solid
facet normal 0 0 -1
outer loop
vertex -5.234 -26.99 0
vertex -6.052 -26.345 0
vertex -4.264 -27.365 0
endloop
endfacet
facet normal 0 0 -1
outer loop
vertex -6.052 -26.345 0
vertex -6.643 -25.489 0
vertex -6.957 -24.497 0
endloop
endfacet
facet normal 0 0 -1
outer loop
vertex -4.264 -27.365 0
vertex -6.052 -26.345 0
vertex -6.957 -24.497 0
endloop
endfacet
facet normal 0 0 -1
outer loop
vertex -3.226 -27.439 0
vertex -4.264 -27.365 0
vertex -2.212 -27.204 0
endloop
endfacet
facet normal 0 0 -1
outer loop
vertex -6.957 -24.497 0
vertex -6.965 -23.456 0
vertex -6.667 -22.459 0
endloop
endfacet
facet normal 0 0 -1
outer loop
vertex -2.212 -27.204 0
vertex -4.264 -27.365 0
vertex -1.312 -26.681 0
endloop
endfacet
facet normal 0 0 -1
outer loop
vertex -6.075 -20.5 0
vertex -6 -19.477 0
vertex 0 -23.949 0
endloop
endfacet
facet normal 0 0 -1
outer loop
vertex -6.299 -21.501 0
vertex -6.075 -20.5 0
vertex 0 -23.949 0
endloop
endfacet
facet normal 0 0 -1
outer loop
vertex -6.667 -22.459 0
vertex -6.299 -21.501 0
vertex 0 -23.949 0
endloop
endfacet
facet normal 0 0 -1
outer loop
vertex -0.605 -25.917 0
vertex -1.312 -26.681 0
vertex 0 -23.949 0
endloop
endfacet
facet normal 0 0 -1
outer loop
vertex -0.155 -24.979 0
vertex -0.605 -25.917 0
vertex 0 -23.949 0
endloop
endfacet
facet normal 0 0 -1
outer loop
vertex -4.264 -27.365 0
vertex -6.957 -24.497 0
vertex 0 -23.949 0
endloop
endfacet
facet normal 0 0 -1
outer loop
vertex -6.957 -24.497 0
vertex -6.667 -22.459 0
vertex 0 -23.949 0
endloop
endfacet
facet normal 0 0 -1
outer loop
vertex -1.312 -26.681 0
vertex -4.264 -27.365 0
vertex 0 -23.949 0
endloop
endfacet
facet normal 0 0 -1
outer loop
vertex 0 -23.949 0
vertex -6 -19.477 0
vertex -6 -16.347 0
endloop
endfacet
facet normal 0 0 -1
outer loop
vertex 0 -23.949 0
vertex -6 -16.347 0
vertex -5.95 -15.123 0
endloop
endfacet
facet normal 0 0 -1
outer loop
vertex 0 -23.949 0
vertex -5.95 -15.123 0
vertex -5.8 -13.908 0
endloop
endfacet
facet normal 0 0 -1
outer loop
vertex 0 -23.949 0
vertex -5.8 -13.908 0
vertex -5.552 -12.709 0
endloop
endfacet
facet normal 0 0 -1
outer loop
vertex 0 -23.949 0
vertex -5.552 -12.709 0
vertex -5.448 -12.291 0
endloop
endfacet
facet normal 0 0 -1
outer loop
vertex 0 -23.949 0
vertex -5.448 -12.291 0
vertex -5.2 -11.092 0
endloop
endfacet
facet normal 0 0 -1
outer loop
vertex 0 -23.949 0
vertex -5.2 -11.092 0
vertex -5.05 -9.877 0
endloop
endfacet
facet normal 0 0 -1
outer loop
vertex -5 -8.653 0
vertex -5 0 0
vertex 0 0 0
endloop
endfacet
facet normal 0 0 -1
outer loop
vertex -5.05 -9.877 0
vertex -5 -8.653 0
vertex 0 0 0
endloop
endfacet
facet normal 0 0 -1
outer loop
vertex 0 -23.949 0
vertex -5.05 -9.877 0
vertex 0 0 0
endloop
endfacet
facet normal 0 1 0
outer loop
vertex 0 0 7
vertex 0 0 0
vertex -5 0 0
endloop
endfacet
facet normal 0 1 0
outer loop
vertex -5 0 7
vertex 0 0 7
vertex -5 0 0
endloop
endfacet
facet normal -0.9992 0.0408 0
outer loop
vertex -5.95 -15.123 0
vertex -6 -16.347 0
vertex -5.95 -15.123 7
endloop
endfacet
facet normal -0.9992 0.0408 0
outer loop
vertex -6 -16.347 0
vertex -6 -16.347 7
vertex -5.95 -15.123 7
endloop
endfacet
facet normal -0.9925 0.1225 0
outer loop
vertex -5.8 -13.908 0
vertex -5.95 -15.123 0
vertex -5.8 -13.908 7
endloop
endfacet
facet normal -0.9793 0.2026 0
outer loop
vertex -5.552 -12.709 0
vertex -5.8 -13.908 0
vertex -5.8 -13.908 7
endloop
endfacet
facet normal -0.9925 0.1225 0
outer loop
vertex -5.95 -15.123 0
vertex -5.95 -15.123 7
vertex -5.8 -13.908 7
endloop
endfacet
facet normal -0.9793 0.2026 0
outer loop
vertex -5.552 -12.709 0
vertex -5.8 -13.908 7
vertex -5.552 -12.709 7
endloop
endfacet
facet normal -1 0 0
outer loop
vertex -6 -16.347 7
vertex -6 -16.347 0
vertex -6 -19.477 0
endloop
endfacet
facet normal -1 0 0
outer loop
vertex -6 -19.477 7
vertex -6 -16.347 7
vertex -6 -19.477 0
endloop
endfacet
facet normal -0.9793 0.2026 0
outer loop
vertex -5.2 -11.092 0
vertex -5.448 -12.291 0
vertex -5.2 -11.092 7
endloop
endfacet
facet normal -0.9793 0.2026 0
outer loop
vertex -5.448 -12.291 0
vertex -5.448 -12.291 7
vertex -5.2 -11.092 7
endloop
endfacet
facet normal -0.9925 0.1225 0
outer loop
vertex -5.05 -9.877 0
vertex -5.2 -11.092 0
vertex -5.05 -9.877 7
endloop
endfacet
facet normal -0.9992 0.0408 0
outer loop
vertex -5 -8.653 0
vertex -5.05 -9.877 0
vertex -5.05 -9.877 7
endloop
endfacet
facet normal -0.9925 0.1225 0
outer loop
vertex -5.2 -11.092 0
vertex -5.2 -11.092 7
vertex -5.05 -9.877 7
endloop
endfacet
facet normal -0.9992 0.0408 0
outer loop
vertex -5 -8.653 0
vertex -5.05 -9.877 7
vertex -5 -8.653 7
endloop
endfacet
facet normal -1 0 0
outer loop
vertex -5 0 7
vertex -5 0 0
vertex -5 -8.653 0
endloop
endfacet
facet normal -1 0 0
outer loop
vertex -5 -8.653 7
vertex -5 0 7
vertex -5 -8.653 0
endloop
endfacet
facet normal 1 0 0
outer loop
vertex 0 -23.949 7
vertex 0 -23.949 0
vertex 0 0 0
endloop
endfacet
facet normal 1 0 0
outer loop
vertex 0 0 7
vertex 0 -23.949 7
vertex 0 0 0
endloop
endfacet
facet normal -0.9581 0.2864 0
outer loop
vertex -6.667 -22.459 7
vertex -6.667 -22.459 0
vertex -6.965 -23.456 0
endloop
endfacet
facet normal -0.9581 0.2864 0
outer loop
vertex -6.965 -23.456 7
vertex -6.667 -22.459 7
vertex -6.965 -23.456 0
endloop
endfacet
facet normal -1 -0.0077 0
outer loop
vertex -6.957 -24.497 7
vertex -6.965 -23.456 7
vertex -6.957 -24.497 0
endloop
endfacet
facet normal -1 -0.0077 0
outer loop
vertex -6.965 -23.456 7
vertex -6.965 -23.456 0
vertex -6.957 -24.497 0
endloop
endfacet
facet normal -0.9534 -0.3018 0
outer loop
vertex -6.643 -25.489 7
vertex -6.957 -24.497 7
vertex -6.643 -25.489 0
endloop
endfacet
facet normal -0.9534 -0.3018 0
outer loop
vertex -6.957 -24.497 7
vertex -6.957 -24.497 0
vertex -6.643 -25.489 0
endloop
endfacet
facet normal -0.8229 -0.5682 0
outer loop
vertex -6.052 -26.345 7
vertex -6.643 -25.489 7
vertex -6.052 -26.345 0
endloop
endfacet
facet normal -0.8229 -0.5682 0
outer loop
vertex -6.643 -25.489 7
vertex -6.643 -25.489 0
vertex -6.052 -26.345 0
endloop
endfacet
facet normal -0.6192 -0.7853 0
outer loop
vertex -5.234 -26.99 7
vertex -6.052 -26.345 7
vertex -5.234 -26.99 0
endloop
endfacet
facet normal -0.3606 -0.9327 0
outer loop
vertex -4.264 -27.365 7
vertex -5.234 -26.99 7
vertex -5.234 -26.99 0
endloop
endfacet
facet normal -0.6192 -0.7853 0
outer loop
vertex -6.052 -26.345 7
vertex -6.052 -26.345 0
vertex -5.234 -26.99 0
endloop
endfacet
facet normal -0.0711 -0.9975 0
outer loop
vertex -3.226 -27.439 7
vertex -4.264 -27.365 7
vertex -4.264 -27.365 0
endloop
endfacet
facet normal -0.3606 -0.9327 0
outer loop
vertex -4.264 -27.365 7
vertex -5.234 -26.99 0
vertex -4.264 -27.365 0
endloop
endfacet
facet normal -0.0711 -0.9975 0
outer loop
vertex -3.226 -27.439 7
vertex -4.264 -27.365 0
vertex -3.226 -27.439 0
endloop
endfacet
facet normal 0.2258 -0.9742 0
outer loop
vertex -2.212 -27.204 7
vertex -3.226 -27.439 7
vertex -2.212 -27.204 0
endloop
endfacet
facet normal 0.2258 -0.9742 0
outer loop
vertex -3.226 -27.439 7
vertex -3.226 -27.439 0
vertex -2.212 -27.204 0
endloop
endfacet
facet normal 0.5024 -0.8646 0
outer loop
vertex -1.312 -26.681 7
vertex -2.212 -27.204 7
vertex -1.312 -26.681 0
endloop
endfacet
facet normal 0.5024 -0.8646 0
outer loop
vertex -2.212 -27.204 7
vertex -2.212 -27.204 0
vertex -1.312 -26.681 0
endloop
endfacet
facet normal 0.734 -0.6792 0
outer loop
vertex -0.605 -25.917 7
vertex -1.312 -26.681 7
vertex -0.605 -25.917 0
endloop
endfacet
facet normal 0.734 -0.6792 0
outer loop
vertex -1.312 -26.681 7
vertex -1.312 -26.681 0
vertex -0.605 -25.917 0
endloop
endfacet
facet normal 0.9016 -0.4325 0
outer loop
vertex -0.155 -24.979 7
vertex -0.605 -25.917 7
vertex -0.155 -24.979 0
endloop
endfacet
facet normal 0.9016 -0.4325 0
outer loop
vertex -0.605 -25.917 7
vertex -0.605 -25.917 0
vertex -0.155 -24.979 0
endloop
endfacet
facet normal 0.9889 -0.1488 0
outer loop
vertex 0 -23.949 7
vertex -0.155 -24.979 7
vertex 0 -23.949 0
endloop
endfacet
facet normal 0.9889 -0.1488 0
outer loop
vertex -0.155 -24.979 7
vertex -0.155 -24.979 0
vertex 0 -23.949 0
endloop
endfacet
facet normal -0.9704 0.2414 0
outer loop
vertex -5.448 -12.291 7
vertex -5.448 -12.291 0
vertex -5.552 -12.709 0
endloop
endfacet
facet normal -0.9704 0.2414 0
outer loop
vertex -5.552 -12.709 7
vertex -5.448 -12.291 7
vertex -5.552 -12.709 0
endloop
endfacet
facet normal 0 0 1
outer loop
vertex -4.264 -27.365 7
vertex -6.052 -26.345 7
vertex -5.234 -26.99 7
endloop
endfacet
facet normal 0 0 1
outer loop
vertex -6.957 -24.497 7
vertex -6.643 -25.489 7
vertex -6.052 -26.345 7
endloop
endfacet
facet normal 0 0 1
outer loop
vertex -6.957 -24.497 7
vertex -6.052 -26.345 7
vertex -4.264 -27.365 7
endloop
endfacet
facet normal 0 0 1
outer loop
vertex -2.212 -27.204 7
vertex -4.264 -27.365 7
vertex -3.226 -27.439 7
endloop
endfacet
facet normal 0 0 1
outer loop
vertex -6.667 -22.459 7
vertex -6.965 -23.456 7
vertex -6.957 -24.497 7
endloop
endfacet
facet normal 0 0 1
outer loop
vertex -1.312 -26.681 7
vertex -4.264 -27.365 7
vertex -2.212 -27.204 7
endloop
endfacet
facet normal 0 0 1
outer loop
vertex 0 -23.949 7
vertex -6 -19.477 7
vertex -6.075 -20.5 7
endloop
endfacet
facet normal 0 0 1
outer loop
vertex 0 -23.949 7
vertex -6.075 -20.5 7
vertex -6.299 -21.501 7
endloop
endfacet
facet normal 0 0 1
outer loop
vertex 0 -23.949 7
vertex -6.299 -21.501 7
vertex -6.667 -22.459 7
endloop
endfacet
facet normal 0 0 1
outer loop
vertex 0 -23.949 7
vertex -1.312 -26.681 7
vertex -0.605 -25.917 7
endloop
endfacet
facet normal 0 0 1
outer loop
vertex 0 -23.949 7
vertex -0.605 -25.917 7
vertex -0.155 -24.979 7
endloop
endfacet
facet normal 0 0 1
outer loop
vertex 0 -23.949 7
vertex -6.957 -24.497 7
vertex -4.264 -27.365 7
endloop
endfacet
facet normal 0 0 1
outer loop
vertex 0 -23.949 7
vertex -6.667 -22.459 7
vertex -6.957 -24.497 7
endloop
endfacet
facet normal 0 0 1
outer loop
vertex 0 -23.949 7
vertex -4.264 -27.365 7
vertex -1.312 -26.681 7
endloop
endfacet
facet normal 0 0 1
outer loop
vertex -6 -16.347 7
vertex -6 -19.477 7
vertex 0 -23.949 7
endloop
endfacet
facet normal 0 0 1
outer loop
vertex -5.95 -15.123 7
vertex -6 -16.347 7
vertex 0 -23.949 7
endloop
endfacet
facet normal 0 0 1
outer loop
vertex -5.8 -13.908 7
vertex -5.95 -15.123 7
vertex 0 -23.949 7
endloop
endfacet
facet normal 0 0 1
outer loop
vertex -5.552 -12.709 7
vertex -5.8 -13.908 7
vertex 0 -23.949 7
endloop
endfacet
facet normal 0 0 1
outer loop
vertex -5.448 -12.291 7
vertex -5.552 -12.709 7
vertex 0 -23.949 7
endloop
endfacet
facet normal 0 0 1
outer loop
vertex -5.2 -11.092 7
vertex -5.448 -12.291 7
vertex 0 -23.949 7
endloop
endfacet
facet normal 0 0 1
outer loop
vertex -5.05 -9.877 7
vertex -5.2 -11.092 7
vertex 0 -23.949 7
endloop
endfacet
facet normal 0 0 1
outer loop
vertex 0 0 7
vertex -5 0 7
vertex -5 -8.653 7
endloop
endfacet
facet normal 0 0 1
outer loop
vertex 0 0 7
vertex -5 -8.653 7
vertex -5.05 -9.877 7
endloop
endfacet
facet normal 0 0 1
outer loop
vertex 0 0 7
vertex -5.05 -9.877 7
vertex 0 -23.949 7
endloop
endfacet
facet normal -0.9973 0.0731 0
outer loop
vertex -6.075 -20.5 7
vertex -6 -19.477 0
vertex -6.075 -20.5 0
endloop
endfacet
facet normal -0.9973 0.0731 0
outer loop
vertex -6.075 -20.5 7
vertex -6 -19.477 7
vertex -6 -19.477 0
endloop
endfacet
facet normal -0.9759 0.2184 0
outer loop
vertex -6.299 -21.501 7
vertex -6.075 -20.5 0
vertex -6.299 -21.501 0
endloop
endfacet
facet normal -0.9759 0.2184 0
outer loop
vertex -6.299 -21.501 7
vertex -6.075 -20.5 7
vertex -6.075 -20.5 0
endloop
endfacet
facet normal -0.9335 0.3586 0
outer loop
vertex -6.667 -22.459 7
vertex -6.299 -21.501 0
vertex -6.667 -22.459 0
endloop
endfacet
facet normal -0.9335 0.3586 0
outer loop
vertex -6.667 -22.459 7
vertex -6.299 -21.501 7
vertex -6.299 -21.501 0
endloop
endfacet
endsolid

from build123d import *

# Parameters (mm, degrees)
BOSS_EXTRU_2_DEPTH = 7
CONG_1_R           = 7
CONG_2_R           = 15


with BuildPart() as part:
    # Esquisse1 → Boss.-Extru.2 (new body)
    with BuildSketch(Plane.XY):
        with BuildLine():
            Line((-5, 0), (-5, -10.5))
            Line((-5, -10.5), (-6, -14.5))
            Line((-6, -14.5), (-6, -21.5))
            ThreePointArc((-6, -21.5), (-4.822875656, -27.189860092), (0, -23.949489743))
            Line((0, -23.949489743), (0, 0))
            Line((0, 0), (-5, 0))
        make_face()
    extrude(amount=BOSS_EXTRU_2_DEPTH)

    # Congé1
    cong_1_edges = [part.edges().sort_by_distance(p)[0] for p in [
        (-6, -21.5, 3.5),
    ]]
    fillet(cong_1_edges, radius=CONG_1_R)

    # Congé2
    cong_2_edges = [part.edges().sort_by_distance(p)[0] for p in [
        (-6, -14.5, 3.5),
        (-5, -10.5, 3.5),
    ]]
    fillet(cong_2_edges, radius=CONG_2_R)


solid = part.part
